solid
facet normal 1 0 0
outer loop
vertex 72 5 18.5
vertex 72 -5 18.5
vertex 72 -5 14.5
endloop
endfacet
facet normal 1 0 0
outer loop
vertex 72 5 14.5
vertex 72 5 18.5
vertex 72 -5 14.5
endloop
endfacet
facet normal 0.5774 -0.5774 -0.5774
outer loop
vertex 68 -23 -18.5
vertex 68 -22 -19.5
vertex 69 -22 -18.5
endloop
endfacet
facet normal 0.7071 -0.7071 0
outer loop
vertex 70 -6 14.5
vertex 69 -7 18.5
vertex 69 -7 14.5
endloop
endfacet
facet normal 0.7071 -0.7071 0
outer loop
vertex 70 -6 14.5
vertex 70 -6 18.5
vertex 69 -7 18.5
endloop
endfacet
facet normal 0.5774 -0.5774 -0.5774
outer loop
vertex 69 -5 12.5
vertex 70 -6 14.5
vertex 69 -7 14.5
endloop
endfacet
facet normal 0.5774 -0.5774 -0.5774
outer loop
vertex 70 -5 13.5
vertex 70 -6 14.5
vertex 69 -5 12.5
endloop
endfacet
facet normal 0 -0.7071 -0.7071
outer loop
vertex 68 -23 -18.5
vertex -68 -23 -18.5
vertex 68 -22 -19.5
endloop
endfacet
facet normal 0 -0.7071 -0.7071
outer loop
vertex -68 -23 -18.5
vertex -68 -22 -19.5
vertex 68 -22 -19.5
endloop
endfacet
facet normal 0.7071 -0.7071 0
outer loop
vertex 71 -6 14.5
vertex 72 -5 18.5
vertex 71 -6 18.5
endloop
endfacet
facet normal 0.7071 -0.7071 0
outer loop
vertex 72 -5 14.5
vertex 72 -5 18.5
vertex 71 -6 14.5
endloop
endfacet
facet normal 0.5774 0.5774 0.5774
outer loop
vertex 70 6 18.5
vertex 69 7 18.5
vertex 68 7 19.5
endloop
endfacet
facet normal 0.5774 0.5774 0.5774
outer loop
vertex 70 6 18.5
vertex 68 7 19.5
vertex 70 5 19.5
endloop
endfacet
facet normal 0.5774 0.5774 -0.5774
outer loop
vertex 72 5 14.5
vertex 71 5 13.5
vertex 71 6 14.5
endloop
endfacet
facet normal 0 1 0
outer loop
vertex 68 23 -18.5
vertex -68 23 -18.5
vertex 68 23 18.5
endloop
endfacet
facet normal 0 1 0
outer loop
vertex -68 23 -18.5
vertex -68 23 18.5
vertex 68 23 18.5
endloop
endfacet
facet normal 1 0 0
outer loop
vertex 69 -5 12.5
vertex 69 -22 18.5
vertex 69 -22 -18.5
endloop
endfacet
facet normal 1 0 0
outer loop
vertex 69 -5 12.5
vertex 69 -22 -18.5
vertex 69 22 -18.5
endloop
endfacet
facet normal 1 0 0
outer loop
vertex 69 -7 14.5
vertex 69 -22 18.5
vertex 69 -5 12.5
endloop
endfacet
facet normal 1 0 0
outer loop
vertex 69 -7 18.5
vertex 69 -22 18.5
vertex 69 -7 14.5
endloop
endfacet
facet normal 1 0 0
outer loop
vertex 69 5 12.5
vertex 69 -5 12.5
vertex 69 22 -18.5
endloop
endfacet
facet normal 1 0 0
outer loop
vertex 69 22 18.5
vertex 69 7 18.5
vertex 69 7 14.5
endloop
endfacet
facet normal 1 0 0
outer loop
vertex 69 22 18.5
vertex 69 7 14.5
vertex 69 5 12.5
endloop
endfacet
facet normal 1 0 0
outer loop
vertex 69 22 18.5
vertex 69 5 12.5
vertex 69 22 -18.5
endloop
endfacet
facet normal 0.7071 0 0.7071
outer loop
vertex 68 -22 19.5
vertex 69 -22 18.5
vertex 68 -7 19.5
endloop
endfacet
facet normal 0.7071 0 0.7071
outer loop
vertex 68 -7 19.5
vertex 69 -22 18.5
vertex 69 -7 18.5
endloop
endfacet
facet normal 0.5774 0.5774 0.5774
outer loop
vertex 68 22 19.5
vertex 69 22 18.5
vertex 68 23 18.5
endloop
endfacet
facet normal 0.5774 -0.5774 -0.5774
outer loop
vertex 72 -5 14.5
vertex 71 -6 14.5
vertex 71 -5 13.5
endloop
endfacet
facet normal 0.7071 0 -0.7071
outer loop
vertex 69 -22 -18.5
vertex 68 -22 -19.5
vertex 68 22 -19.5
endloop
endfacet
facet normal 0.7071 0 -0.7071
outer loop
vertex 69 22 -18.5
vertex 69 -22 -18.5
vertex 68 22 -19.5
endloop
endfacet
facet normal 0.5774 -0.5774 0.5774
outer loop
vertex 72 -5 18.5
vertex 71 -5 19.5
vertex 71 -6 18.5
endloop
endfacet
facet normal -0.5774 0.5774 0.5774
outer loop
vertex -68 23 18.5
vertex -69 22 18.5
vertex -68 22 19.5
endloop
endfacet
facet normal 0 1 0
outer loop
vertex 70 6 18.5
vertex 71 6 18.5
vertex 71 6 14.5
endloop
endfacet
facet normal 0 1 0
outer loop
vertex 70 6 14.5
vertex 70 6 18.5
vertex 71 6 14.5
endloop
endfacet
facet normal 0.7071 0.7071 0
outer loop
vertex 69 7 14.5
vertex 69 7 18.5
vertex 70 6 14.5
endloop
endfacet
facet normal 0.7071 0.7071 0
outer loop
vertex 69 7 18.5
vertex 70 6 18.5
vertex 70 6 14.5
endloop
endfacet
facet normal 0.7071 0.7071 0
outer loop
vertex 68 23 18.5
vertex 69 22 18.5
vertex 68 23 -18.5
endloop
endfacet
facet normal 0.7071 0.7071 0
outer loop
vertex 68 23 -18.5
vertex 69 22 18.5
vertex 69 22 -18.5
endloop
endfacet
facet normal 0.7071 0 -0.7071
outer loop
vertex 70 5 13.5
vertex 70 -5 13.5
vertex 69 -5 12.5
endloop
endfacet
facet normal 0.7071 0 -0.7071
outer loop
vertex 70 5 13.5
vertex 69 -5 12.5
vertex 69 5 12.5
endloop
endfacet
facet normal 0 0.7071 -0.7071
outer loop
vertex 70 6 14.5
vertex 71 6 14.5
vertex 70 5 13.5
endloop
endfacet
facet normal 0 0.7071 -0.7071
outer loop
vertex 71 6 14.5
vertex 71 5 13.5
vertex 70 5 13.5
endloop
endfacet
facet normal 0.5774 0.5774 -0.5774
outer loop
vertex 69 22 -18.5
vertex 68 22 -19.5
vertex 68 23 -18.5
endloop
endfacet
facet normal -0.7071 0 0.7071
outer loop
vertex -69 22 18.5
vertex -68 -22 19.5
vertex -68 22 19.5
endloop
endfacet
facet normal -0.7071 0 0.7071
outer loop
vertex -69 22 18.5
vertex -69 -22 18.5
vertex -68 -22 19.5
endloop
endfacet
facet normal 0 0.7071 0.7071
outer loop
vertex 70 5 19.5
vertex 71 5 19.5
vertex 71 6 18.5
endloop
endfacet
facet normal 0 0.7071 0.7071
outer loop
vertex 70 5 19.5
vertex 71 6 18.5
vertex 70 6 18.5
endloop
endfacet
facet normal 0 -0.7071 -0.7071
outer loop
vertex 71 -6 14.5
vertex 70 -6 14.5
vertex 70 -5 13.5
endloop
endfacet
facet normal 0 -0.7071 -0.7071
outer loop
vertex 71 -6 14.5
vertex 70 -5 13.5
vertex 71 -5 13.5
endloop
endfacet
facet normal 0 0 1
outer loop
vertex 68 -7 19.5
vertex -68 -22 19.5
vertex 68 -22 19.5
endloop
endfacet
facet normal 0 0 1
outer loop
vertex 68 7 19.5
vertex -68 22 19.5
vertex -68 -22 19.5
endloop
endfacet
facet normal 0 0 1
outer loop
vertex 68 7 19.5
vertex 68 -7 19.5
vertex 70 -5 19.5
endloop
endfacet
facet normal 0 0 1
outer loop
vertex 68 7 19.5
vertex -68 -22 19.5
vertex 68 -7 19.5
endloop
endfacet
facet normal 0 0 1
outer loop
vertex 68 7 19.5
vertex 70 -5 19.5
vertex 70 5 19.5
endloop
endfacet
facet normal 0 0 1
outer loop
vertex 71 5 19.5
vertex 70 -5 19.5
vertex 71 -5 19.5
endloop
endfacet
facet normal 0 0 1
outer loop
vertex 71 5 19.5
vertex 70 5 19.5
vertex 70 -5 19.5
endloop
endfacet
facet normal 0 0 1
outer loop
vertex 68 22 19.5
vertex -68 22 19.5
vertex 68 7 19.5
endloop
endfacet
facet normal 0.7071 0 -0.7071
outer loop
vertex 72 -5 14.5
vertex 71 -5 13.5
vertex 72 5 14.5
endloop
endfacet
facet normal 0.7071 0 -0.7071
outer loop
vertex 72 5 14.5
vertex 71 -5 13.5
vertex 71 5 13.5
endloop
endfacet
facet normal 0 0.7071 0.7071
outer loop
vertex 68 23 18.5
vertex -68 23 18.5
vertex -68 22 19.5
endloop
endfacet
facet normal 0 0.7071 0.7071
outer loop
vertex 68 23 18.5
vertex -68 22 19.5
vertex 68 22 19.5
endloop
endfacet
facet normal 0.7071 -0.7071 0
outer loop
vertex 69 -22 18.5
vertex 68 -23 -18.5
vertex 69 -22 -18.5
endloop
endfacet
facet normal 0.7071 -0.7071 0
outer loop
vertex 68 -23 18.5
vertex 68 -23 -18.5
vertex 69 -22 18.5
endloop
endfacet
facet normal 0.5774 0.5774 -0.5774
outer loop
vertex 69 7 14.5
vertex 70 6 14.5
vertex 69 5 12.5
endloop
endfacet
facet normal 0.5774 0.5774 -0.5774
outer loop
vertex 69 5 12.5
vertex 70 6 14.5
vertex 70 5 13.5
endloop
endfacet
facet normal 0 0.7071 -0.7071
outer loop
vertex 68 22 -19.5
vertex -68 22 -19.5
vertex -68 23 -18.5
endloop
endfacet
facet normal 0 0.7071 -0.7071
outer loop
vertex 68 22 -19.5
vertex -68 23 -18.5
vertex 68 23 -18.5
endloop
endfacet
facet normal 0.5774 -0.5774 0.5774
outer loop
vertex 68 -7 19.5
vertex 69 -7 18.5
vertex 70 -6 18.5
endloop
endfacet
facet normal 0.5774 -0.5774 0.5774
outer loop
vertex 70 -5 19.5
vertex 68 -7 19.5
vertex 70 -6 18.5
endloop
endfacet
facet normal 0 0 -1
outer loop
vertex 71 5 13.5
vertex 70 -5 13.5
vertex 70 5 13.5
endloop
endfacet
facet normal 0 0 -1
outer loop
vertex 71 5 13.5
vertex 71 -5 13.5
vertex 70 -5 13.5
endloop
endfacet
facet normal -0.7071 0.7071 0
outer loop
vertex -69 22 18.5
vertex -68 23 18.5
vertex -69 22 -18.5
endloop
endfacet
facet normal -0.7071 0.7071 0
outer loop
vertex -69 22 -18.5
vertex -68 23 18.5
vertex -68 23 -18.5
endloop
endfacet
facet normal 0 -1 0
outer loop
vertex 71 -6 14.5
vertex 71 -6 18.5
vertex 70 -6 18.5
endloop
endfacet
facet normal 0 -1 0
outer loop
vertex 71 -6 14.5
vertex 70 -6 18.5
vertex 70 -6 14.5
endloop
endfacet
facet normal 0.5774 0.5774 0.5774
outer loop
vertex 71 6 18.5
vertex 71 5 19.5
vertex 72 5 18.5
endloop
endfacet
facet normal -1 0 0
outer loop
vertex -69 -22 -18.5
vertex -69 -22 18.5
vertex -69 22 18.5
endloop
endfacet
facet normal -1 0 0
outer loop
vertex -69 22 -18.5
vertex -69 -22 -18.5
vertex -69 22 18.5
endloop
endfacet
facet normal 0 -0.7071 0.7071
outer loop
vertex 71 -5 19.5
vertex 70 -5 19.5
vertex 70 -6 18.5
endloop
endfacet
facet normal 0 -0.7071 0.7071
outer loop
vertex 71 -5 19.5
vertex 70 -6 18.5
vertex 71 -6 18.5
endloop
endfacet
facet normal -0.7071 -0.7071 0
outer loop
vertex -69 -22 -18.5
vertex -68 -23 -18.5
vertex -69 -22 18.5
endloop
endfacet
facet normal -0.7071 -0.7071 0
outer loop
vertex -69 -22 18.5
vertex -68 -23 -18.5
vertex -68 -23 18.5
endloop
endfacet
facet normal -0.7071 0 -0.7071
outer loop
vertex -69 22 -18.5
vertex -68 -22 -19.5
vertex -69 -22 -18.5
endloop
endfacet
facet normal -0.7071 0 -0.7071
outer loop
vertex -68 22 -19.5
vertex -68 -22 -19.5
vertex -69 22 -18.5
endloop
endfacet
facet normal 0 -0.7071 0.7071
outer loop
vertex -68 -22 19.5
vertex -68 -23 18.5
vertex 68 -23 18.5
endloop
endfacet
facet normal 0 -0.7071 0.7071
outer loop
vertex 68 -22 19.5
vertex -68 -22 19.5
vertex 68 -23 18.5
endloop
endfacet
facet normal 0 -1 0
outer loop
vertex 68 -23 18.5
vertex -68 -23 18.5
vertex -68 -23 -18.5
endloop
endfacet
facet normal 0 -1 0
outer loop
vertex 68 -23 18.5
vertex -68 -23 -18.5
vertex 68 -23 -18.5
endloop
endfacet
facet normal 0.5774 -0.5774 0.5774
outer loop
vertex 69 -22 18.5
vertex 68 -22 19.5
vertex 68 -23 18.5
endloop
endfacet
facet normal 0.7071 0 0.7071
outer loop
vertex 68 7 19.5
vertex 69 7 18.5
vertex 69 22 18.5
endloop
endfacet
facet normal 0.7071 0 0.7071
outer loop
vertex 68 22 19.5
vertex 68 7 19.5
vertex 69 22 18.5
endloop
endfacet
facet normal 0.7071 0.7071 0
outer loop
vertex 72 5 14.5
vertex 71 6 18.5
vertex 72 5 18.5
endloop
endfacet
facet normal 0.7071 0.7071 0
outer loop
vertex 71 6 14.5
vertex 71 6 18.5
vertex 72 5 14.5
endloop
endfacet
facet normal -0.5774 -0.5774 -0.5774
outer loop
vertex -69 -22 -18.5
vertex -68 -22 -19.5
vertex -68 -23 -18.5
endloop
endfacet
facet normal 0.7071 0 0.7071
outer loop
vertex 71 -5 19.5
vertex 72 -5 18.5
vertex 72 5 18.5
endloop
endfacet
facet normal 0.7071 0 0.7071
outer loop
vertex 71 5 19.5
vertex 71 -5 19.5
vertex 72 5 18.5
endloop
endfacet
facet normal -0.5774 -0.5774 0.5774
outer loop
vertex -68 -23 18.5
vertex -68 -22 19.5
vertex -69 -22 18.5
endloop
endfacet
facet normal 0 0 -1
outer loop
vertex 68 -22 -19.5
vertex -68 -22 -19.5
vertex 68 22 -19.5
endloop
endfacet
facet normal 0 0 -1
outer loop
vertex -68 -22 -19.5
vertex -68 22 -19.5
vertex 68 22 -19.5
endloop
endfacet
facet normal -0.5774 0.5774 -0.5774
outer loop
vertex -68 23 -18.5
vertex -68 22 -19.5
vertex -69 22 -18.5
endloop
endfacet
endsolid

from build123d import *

# Parameters (mm, degrees)
SKETCH1_W           = 138
SKETCH1_H           = 46
BOSS_EXTRUDE1_DEPTH = 19.5
SKETCH2_W           = 6
SKETCH2_H           = 12
BOSS_EXTRUDE2_DEPTH = 3
CHAMFER1_SIZE       = 1


with BuildPart() as part:
    # Sketch1 → Boss-Extrude1 (new body, symmetric)
    with BuildSketch(Plane.XY):
        Rectangle(SKETCH1_W, SKETCH1_H)
    extrude(amount=BOSS_EXTRUDE1_DEPTH, both=True)

    # Sketch2 → Boss-Extrude2 (add, symmetric)
    with BuildSketch(Plane(origin=(69, 0, 0), x_dir=(0, 0, -1), z_dir=(1, 0, 0))):
        with Locations((-16.5, 0)):
            Rectangle(SKETCH2_W, SKETCH2_H)
    extrude(amount=BOSS_EXTRUDE2_DEPTH, both=True)

    # Chamfer1
    chamfer1_edges = [part.edges().sort_by_distance(p)[0] for p in [
        (-69, 0, 19.5),
        (0, -23, 19.5),
        (69, 14.5, 19.5),
        (69, 0, 13.5),
        (70.5, 6, 19.5),
        (70.5, -6, 13.5),
        (70.5, -6, 19.5),
        (69, -6, 16.5),
        (70.5, 6, 13.5),
        (69, 6, 16.5),
        (72, 0, 19.5),
        (72, -6, 16.5),
        (72, 0, 13.5),
        (72, 6, 16.5),
        (69, -14.5, 19.5),
        (0, -23, -19.5),
        (-69, 0, -19.5),
        (0, 23, -19.5),
        (69, 0, -19.5),
        (69, -23, 0),
        (-69, -23, 0),
        (-69, 23, 0),
        (69, 23, 0),
        (0, 23, 19.5),
    ]]
    chamfer(chamfer1_edges, length=CHAMFER1_SIZE)


solid = part.part
